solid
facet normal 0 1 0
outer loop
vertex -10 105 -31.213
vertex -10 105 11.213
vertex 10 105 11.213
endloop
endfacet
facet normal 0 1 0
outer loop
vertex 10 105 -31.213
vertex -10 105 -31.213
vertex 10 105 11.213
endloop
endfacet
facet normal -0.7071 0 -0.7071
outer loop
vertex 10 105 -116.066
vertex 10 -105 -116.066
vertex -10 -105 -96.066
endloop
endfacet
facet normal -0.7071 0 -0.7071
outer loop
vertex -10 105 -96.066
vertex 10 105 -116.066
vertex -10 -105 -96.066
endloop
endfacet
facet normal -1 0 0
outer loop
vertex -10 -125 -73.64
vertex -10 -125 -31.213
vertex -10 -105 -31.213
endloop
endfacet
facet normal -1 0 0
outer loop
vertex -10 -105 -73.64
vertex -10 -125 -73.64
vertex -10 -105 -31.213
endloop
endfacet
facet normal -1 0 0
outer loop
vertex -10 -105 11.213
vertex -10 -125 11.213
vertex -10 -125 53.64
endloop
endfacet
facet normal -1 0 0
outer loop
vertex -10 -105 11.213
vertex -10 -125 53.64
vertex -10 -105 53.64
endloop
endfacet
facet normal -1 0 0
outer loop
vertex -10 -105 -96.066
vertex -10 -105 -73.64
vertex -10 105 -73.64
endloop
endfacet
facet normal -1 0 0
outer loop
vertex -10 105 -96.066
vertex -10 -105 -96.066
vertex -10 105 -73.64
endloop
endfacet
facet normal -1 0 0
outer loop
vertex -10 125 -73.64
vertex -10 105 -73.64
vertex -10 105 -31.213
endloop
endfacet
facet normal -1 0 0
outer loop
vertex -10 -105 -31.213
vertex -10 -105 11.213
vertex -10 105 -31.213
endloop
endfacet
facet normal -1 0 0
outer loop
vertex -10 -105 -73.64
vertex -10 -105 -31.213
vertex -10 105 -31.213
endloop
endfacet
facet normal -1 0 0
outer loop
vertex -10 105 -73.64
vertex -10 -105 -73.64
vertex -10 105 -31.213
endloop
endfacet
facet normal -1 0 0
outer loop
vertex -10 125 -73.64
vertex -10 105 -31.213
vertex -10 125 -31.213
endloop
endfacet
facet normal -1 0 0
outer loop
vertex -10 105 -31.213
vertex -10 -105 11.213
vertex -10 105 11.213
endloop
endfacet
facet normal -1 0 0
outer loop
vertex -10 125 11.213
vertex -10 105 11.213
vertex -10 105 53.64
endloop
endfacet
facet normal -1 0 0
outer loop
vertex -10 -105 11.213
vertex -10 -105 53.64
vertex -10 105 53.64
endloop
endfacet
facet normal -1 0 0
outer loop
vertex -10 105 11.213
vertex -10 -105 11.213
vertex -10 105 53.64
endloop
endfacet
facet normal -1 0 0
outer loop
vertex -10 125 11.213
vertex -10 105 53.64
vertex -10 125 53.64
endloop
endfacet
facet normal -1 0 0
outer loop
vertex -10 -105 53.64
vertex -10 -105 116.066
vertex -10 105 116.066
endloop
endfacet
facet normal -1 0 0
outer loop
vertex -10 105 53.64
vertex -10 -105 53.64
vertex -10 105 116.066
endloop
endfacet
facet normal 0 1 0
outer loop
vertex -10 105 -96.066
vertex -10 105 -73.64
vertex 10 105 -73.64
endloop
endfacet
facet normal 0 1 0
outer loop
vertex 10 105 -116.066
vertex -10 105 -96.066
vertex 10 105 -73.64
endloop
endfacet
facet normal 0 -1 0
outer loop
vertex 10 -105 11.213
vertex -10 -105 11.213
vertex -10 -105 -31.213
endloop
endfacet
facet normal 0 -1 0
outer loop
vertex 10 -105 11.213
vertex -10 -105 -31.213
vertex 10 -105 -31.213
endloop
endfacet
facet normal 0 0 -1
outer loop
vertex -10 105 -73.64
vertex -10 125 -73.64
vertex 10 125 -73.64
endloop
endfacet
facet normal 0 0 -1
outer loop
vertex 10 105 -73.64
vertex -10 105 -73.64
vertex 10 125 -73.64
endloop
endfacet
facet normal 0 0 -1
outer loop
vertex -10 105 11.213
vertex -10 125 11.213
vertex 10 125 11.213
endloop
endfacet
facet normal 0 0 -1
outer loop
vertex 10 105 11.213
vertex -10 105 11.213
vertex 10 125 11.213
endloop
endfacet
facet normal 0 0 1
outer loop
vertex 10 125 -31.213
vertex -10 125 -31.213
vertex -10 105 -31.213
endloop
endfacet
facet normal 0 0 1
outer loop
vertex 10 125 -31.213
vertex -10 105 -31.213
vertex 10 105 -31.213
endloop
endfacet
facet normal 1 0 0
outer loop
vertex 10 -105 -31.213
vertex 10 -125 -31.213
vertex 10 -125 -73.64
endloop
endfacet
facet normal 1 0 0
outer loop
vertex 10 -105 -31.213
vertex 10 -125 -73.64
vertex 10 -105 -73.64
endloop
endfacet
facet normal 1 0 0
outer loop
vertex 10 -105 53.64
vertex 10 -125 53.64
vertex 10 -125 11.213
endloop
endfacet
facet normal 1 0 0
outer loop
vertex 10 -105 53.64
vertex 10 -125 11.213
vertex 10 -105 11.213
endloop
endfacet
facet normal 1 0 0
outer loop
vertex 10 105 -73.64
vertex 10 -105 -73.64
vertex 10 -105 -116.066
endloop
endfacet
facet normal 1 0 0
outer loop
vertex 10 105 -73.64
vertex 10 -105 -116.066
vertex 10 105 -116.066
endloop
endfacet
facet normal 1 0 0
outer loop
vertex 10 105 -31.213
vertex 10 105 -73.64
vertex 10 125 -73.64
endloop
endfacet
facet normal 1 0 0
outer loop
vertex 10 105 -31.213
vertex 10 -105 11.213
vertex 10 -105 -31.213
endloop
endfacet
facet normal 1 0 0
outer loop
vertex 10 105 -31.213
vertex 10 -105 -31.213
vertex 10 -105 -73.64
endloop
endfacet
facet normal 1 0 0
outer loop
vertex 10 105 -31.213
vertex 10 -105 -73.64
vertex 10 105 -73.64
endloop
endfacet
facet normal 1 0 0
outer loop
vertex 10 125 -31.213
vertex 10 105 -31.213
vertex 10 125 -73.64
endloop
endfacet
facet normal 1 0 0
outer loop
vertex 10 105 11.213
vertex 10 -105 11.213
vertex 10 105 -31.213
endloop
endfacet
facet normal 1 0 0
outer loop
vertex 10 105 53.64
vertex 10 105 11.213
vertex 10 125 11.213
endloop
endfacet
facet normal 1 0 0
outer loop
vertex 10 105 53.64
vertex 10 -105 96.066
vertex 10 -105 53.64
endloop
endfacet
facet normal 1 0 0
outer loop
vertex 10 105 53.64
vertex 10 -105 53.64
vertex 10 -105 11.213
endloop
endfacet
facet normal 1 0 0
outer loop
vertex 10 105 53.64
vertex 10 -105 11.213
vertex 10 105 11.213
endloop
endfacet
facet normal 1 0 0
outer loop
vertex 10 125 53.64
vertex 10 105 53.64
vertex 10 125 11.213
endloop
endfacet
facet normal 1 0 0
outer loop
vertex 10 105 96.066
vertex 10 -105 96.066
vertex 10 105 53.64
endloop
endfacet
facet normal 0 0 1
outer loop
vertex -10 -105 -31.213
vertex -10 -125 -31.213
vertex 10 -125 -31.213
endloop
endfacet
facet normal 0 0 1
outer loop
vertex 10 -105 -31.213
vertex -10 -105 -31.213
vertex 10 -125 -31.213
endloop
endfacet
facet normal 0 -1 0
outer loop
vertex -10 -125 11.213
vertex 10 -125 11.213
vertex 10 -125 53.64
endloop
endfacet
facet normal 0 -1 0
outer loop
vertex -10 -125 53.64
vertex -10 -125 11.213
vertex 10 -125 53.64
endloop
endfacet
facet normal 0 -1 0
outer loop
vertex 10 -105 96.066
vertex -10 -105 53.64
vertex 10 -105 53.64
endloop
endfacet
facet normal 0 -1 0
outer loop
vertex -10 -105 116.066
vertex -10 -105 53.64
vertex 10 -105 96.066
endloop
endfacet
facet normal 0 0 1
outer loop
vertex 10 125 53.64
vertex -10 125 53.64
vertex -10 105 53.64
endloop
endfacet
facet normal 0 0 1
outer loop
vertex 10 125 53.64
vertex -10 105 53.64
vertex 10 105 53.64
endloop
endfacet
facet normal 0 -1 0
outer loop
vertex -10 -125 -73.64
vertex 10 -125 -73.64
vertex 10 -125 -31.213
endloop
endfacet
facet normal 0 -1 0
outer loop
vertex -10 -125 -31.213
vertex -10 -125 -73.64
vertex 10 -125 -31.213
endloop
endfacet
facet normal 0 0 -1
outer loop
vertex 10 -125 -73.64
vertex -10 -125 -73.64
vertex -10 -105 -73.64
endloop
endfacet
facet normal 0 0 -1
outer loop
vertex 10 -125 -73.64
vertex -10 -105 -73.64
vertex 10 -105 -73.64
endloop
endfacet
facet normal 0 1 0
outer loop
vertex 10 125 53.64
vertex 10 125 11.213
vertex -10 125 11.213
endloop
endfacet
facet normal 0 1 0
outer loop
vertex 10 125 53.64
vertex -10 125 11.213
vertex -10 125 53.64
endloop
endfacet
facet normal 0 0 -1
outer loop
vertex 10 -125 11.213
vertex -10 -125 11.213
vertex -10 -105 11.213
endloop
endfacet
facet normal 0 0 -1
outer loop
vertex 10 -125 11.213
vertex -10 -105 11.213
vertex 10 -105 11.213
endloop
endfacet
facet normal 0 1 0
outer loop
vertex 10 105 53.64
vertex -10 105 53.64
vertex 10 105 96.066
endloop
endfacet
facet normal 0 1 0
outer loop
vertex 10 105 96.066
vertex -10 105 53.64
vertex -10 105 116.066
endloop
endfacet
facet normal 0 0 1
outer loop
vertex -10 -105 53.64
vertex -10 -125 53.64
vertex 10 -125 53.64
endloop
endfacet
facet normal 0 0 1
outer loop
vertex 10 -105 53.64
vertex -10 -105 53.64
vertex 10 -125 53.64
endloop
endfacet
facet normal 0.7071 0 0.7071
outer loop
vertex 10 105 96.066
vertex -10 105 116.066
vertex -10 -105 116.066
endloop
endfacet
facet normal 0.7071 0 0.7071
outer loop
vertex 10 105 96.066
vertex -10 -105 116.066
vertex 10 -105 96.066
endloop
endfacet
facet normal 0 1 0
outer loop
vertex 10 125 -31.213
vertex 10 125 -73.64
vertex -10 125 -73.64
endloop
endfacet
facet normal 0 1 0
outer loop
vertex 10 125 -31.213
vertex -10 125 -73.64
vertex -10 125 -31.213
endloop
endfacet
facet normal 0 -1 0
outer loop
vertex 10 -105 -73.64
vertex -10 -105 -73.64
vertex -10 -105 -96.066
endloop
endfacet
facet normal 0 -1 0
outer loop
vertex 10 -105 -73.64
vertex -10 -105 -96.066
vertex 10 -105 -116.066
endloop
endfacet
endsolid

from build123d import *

# Parameters (mm, degrees)
F2_W     = 250
F2_H     = 232.13203
F3_DEPTH = 10
F5_DEPTH = 125
F6_W     = 20
F6_H     = 42.426406
F7_DEPTH = 20


# Not quite as in the source:
# - a pattern or mirror of a feature is missing from the dataset's text; its kind, count and spacing are read off the source's solid


with BuildPart() as f3:
    # F2 (on Right) → F3 (new body, symmetric)
    with BuildSketch(Plane.YZ):
        Rectangle(F2_W, F2_H)
    extrude(amount=F3_DEPTH, both=True)

    # F4 (on Front) → F5 (cut, symmetric)
    with BuildSketch(Plane.XZ):
        Polygon((10, 116.066015), (-10, 116.066015), (10, 96.066015), align=None)
        Polygon((-10, -116.066015), (10, -116.066015), (-10, -96.066015), align=None)
    extrude(amount=F5_DEPTH, both=True, mode=Mode.SUBTRACT)

    # F6 (on face) → F7 (cut)
    with BuildSketch(Plane.XZ.offset(125)):
        Polygon((-10, 53.639609), (10, 53.639609), (10, 96.066015), (-10, 116.066015), (-10, 96.066015), align=None)
        with Locations((0, -10)):
            Rectangle(F6_W, F6_H)
        with Locations((0, -94.852812)):
            Rectangle(F6_W, F6_H)
    f7 = extrude(amount=-F7_DEPTH, mode=Mode.SUBTRACT)

    # F7_copies: F7 across plane
    add(f7.mirror(Plane.ZX), mode=Mode.SUBTRACT)


solid = f3.part
